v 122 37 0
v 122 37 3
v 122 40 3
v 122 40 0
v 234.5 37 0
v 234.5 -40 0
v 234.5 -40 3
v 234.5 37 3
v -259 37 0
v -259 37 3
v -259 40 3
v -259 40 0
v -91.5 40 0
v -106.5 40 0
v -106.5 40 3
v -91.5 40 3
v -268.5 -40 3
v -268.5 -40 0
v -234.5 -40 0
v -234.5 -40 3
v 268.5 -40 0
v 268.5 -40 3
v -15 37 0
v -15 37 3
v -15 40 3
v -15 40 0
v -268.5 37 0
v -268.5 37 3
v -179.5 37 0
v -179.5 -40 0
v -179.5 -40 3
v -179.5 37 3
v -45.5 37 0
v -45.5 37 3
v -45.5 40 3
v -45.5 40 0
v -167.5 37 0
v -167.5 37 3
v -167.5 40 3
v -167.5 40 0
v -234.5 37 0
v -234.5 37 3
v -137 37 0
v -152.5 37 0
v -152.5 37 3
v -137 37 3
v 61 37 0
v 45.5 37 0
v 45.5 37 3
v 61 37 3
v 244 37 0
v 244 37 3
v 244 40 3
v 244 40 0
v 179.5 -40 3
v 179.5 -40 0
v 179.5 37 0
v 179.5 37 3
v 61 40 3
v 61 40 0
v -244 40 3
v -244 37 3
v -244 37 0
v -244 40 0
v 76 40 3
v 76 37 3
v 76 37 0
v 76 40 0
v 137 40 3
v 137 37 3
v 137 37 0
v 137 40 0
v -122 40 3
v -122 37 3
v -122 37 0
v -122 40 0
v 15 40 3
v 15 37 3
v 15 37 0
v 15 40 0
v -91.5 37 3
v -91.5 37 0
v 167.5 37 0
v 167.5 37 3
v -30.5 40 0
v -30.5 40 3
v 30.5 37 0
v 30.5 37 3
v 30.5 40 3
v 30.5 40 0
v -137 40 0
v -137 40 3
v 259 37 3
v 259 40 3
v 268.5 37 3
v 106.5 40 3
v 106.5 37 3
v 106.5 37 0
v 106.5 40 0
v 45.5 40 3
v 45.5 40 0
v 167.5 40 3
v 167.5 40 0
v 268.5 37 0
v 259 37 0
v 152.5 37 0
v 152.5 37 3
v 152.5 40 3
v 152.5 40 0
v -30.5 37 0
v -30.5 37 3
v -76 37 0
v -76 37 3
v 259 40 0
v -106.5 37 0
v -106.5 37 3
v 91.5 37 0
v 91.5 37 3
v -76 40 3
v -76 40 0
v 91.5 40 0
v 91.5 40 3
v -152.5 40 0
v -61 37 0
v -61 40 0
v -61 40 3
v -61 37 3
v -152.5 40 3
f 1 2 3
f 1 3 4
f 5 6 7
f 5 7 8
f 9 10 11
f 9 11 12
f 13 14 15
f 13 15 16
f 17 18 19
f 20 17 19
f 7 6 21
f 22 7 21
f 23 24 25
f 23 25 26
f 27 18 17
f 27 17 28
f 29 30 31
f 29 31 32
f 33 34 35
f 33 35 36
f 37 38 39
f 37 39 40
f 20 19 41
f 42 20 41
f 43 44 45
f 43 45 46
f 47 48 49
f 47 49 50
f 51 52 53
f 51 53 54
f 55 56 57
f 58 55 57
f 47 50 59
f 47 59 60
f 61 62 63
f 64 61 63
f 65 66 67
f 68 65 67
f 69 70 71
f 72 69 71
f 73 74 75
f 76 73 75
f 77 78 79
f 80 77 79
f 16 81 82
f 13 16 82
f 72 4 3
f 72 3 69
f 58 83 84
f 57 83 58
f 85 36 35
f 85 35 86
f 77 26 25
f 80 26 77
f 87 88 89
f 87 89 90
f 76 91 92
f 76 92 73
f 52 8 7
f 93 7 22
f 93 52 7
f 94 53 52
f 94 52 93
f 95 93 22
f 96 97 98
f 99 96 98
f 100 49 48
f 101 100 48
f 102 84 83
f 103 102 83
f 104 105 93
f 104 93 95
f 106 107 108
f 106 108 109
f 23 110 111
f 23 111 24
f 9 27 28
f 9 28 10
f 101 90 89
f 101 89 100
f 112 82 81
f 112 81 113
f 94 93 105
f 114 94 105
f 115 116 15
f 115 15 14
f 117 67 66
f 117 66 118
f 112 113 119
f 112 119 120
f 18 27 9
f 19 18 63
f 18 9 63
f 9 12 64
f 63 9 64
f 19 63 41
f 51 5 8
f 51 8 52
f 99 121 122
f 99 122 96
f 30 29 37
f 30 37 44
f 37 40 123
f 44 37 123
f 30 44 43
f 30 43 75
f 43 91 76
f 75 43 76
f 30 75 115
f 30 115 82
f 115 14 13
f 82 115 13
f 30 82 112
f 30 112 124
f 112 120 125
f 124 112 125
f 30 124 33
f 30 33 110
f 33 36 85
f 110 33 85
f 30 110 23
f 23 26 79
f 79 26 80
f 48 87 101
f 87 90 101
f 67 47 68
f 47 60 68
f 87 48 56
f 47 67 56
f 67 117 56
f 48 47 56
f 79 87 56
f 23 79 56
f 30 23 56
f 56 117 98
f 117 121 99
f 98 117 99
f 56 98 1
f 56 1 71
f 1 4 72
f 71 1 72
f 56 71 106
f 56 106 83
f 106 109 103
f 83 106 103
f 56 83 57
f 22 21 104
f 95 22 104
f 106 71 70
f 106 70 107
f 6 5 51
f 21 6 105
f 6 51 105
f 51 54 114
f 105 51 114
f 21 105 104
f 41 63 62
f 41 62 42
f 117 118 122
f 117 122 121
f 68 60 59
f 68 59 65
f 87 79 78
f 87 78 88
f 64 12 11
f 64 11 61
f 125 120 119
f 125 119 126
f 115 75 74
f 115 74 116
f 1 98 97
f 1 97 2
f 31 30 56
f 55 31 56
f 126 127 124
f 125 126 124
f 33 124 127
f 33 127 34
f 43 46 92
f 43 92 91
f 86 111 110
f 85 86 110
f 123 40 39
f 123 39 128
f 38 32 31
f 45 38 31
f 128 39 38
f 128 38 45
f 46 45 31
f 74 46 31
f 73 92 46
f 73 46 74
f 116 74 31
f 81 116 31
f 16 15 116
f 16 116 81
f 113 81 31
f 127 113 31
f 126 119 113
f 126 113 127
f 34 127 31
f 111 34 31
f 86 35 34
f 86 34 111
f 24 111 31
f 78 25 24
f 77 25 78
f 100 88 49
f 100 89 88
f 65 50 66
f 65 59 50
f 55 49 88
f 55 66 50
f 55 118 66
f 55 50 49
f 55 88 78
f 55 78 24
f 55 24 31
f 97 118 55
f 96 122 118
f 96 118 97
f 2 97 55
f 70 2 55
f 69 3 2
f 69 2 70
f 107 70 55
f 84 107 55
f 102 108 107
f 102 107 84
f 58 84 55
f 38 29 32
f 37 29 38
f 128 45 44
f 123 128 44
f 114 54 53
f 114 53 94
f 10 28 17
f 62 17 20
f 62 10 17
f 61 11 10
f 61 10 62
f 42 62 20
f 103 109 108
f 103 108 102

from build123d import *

# Parameters (mm, degrees)
SKETCH1_W             = 34
SKETCH1_H             = 80
BOSS_EXTRUDE1_DEPTH   = 3
SKETCH1_W_2           = 359
BOSS_EXTRUDE1_2_DEPTH = 3
BOSS_EXTRUDE1_3_DEPTH = 3
CAVITY1_START         = 37
CAVITY1_OUTLINE_W     = 9.5
CAVITY1_OUTLINE_H     = 3
CAVITY1_OUTLINE_W_2   = 12
CAVITY1_OUTLINE_W_3   = 15.5
CAVITY1_DEPTH         = 3


# Read off the part's stored shape, not the designer's step: Cavity1
with BuildPart() as part:
    # Sketch1 → Boss-Extrude1 (new body)
    with BuildSketch(Plane.XY):
        with Locations((-251.5, 0)):
            Rectangle(SKETCH1_W, SKETCH1_H)
    extrude(amount=BOSS_EXTRUDE1_DEPTH)


with BuildPart() as body_2:
    # Sketch1 → Boss-Extrude1 2 (new body)
    with BuildSketch(Plane.XY):
        Rectangle(SKETCH1_W_2, SKETCH1_H)
    extrude(amount=BOSS_EXTRUDE1_2_DEPTH)


with BuildPart() as body_3:
    # Sketch1 → Boss-Extrude1 3 (new body)
    with BuildSketch(Plane.XY):
        with Locations((251.5, 0)):
            Rectangle(SKETCH1_W, SKETCH1_H)
    extrude(amount=BOSS_EXTRUDE1_3_DEPTH)


with BuildPart() as cavity1_tool:
    # Cavity1 outline → Cavity1 (new body)
    with BuildSketch(Plane(origin=(0, 0, 0), x_dir=(1, 0, 0), z_dir=(0, 1, 0)).offset(CAVITY1_START)):
        with Locations((239.25, -1.5)):
            Rectangle(CAVITY1_OUTLINE_W, CAVITY1_OUTLINE_H)
        with Locations((263.75, -1.5)):
            Rectangle(CAVITY1_OUTLINE_W, CAVITY1_OUTLINE_H)
        with Locations((-173.5, -1.5)):
            Rectangle(CAVITY1_OUTLINE_W_2, CAVITY1_OUTLINE_H)
        with Locations((-144.75, -1.5)):
            Rectangle(CAVITY1_OUTLINE_W_3, CAVITY1_OUTLINE_H)
        with Locations((-114.25, -1.5)):
            Rectangle(CAVITY1_OUTLINE_W_3, CAVITY1_OUTLINE_H)
        with Locations((-83.75, -1.5)):
            Rectangle(CAVITY1_OUTLINE_W_3, CAVITY1_OUTLINE_H)
        with Locations((-53.25, -1.5)):
            Rectangle(CAVITY1_OUTLINE_W_3, CAVITY1_OUTLINE_H)
        with Locations((-22.75, -1.5)):
            Rectangle(CAVITY1_OUTLINE_W_3, CAVITY1_OUTLINE_H)
        with Locations((22.75, -1.5)):
            Rectangle(CAVITY1_OUTLINE_W_3, CAVITY1_OUTLINE_H)
        with Locations((53.25, -1.5)):
            Rectangle(CAVITY1_OUTLINE_W_3, CAVITY1_OUTLINE_H)
        with Locations((83.75, -1.5)):
            Rectangle(CAVITY1_OUTLINE_W_3, CAVITY1_OUTLINE_H)
        with Locations((114.25, -1.5)):
            Rectangle(CAVITY1_OUTLINE_W_3, CAVITY1_OUTLINE_H)
        with Locations((144.75, -1.5)):
            Rectangle(CAVITY1_OUTLINE_W_3, CAVITY1_OUTLINE_H)
        with Locations((173.5, -1.5)):
            Rectangle(CAVITY1_OUTLINE_W_2, CAVITY1_OUTLINE_H)
        with Locations((-263.75, -1.5)):
            Rectangle(CAVITY1_OUTLINE_W, CAVITY1_OUTLINE_H)
        with Locations((-239.25, -1.5)):
            Rectangle(CAVITY1_OUTLINE_W, CAVITY1_OUTLINE_H)
    extrude(amount=CAVITY1_DEPTH)


with BuildPart() as part_1:
    add(part.part)

    # Cavity1: cut by cavity1_tool
    add(cavity1_tool.part, mode=Mode.SUBTRACT)


with BuildPart() as body_2_1:
    add(body_2.part)

    # Cavity1: cut by cavity1_tool
    add(cavity1_tool.part, mode=Mode.SUBTRACT)


with BuildPart() as body_3_1:
    add(body_3.part)

    # Cavity1: cut by cavity1_tool
    add(cavity1_tool.part, mode=Mode.SUBTRACT)


solid = Compound([part_1.part, body_2_1.part, body_3_1.part])
